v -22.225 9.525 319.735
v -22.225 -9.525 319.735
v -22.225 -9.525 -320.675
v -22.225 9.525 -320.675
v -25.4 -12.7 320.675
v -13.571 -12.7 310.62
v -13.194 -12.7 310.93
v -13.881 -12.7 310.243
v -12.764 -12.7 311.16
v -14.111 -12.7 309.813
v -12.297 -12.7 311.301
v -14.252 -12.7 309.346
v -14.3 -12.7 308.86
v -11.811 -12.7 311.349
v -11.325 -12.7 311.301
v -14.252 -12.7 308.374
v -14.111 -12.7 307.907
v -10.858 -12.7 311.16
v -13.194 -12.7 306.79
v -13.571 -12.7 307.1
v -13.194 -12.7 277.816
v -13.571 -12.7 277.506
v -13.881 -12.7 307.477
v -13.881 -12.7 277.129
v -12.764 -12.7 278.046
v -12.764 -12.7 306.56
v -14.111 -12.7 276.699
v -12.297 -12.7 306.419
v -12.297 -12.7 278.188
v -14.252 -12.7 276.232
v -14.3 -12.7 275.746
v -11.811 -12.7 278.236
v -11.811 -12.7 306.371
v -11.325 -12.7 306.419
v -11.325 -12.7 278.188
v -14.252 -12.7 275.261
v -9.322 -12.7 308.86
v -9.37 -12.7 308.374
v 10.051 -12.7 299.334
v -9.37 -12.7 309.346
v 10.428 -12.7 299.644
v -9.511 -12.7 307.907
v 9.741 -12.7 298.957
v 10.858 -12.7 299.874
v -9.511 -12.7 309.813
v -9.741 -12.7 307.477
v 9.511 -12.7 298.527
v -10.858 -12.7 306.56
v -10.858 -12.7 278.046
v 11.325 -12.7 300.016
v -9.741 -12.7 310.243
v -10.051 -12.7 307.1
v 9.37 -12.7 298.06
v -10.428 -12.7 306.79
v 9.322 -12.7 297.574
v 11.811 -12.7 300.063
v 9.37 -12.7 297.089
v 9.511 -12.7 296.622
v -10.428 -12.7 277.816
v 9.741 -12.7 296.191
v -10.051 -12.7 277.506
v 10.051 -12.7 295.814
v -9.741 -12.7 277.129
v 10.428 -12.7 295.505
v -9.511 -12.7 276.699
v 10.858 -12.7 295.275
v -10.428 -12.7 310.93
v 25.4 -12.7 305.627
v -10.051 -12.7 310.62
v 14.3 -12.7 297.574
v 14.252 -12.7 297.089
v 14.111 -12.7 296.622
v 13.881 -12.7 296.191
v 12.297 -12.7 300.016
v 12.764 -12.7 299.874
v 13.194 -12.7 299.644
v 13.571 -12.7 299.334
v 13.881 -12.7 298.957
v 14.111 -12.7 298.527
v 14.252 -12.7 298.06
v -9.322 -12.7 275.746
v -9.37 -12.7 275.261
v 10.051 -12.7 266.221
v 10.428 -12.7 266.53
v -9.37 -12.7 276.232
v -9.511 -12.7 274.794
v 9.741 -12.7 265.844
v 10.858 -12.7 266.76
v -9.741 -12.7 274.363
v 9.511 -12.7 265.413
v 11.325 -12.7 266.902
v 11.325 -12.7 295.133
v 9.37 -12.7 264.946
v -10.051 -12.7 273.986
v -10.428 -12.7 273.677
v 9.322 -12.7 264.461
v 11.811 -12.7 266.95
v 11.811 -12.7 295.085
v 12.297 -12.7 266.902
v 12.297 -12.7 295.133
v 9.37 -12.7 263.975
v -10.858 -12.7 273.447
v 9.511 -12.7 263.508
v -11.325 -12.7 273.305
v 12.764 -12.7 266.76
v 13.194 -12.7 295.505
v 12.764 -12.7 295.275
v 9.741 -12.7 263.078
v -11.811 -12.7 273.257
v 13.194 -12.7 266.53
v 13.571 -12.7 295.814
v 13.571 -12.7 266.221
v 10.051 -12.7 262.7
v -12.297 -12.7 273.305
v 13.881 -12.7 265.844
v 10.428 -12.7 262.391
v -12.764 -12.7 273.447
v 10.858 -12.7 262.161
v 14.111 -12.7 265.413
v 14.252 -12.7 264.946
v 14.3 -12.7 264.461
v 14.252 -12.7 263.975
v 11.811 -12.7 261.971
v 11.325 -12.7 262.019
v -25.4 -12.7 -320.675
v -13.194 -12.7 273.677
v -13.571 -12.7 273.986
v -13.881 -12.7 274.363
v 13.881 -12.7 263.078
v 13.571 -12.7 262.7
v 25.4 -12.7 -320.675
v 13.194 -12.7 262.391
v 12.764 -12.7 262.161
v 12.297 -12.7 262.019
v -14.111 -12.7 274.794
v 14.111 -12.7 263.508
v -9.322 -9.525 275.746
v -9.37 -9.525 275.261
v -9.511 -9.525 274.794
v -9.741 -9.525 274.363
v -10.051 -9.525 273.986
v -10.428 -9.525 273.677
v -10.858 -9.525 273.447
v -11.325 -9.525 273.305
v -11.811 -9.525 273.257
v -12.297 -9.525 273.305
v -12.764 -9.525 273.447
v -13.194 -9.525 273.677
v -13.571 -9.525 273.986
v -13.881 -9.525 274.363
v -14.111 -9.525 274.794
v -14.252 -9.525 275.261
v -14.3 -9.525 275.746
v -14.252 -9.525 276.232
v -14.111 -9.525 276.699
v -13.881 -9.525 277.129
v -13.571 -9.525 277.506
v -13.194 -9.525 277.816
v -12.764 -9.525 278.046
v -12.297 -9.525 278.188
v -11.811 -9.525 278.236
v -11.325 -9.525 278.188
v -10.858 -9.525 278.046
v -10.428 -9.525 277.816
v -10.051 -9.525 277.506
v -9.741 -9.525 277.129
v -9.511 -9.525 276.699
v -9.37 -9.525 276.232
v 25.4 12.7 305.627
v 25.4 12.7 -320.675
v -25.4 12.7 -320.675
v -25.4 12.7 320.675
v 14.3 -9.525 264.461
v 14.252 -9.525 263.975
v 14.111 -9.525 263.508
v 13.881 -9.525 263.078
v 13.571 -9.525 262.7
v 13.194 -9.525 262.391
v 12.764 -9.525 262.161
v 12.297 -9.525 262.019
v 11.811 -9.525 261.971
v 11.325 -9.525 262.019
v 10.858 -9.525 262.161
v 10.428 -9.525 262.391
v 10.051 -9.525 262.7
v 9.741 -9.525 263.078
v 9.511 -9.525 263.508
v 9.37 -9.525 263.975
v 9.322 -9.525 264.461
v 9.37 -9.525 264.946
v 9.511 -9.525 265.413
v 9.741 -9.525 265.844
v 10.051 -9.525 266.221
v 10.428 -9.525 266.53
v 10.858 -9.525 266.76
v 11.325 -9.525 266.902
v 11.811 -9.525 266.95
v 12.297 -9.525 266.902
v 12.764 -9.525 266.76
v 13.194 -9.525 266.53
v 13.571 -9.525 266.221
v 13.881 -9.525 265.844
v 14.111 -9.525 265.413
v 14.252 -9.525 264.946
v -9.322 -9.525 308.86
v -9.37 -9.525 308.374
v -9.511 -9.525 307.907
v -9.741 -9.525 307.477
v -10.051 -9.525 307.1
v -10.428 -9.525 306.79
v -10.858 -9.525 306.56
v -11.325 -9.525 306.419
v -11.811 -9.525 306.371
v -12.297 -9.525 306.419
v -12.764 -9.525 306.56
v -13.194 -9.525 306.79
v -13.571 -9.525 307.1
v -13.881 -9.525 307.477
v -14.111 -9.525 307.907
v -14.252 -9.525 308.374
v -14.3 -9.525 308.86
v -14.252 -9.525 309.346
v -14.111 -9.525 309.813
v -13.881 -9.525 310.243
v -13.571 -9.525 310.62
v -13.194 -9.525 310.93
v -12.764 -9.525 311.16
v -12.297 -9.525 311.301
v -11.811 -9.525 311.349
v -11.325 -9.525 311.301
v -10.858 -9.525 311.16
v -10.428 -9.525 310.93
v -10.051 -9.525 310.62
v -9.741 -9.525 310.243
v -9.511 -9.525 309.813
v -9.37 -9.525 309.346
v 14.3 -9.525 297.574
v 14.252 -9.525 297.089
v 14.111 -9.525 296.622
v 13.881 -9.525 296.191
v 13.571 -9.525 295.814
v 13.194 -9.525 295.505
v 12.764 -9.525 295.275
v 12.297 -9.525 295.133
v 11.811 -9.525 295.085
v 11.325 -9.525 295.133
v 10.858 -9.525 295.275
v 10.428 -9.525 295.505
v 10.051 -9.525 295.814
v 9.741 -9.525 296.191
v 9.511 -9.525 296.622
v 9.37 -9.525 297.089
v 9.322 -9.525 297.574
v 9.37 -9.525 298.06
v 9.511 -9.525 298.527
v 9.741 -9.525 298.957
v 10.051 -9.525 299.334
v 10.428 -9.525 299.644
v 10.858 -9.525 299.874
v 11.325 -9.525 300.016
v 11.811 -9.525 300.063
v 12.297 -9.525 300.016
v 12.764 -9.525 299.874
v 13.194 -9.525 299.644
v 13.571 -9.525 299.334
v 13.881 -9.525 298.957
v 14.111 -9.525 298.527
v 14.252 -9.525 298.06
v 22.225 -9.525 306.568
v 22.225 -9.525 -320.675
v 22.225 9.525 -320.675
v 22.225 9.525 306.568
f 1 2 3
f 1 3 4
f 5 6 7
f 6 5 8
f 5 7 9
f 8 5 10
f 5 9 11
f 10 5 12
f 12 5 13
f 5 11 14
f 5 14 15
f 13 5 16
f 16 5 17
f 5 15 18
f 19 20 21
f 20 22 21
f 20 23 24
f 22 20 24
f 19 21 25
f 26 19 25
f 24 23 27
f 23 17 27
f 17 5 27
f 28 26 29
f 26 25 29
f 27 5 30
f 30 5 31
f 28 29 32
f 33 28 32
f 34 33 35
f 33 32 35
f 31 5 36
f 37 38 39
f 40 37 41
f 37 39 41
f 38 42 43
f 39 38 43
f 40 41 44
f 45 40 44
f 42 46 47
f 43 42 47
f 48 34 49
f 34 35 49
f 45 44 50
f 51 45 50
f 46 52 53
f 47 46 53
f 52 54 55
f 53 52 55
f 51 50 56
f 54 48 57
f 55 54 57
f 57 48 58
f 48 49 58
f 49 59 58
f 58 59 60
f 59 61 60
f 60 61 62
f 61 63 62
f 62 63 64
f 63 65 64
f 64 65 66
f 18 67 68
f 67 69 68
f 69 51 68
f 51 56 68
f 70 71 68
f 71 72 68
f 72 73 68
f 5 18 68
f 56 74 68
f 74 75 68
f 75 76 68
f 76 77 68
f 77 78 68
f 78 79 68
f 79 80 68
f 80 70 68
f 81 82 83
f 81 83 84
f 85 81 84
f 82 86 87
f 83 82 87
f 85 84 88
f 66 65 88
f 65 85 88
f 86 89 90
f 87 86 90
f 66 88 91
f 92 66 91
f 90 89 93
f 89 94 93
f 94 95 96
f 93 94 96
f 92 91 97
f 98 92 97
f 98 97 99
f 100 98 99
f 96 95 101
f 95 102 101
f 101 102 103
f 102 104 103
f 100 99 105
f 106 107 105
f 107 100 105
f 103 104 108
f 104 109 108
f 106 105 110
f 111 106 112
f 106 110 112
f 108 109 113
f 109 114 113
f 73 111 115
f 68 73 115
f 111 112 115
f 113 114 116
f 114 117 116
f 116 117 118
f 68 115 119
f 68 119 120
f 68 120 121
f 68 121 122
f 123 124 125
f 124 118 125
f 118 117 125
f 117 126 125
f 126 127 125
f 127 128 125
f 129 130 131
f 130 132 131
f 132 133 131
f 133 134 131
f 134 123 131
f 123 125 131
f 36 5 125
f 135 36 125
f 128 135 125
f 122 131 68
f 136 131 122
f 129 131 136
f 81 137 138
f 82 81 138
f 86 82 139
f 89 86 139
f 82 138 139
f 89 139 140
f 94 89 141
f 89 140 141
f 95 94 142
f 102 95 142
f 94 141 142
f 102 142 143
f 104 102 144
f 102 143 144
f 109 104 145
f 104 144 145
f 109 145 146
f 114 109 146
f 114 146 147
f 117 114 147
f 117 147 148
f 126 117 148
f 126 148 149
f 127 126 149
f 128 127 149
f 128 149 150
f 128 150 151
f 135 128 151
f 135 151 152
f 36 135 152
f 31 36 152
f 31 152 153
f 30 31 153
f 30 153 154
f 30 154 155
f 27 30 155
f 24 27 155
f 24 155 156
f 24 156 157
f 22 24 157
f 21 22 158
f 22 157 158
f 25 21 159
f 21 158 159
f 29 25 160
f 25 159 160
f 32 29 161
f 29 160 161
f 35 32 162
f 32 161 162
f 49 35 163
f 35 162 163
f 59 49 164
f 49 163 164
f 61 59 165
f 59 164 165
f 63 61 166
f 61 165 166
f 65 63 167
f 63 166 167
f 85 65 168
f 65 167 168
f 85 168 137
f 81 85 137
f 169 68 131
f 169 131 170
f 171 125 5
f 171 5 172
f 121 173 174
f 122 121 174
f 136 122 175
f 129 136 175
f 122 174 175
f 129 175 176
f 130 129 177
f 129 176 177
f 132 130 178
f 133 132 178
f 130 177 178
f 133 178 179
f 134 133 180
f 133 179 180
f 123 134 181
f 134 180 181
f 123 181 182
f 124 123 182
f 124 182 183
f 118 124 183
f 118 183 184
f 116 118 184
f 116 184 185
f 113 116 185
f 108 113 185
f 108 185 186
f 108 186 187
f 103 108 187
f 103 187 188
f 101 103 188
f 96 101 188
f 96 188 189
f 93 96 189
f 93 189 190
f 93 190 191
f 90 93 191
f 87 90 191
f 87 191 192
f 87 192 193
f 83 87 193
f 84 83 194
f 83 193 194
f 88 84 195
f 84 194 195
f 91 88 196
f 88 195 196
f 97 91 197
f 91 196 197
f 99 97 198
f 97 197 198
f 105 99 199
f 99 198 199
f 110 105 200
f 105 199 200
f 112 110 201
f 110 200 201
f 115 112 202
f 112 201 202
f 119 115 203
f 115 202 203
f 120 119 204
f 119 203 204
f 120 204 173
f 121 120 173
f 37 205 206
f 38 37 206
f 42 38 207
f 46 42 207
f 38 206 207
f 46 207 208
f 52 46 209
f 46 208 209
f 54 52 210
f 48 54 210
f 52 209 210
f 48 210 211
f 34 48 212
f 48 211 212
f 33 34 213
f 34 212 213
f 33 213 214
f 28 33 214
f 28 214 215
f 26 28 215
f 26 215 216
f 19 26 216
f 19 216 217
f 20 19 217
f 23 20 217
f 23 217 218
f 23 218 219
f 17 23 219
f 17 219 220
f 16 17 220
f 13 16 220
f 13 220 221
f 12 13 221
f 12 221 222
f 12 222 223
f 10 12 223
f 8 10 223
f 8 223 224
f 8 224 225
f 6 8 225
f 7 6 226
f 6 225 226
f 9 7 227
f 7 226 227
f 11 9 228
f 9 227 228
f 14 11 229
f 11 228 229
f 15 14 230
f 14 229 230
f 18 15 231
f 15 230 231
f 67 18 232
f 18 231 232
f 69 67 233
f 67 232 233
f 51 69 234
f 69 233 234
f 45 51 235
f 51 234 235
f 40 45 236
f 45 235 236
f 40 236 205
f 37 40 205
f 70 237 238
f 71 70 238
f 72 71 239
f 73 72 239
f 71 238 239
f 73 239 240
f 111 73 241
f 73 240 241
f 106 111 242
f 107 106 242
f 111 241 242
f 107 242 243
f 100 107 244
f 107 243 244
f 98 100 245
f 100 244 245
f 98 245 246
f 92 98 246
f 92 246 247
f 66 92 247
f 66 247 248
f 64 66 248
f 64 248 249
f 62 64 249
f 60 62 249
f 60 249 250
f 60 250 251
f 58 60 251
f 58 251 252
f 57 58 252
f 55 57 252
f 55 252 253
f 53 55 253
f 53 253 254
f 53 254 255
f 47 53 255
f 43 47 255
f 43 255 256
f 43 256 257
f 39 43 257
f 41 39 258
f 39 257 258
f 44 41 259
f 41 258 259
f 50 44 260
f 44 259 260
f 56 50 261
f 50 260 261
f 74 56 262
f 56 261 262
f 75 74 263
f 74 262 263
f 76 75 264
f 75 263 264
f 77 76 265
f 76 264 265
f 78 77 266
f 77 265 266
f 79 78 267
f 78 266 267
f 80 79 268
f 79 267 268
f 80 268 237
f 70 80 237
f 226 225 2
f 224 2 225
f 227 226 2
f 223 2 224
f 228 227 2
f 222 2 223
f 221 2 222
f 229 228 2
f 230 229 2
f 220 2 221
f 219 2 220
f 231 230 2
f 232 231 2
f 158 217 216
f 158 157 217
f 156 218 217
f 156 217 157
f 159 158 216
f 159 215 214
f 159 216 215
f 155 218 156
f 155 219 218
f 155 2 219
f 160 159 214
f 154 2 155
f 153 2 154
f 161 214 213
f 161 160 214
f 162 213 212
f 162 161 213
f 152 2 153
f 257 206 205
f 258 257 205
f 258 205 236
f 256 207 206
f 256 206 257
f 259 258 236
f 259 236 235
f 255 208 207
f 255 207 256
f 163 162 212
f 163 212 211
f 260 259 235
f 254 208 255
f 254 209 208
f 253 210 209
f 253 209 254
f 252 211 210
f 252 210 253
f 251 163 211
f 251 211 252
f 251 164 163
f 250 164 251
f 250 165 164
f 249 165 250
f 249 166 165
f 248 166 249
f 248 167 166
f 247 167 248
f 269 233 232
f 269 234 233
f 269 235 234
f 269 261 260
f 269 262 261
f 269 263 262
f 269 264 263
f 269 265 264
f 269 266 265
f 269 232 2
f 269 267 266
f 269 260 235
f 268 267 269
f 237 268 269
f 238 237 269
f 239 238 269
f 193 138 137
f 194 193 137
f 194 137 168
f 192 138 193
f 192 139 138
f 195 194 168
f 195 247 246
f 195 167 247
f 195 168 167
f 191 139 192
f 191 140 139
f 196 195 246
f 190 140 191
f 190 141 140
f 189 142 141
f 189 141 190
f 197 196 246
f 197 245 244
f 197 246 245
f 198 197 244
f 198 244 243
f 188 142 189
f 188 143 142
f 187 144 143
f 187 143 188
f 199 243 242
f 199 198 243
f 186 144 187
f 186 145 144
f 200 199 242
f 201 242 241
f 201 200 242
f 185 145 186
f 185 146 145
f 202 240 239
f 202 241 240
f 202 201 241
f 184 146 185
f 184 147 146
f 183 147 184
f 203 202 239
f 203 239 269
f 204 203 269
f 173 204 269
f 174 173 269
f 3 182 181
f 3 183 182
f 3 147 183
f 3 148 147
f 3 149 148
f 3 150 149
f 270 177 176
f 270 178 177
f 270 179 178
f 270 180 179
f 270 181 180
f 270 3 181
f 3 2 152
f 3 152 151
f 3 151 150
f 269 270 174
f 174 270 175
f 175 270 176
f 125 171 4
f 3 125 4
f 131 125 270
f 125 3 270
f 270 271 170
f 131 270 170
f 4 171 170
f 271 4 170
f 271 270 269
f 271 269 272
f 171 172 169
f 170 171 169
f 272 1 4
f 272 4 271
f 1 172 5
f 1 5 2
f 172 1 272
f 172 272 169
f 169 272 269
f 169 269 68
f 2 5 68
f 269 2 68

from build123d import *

# Parameters (mm, degrees)
BOSS_EXTRUDE1_DEPTH        = 320.675
BOSS_EXTRUDE1_DEPTH_BACK   = 320.675
SKETCH3_W                  = 50.8
SKETCH3_H                  = 25.4
SKETCH3_W_2                = 44.45
SKETCH3_H_2                = 19.05
CUT_EXTRUDE1_DEPTH         = 323.680609311
CUT_EXTRUDE1_DEPTH_BACK    = 323.680609311
F_10_CLEARANCE_HOLE1_D     = 4.9784
F_10_CLEARANCE_HOLE1_DEPTH = 5.08
F_10_CLEARANCE_HOLE1_TIP   = 1.495662253


with BuildPart() as part:
    # Sketch3 → Boss-Extrude1 (new, two sides: drawn at the far end of the back side and taken through both)
    with BuildSketch(Plane.XY.offset(-BOSS_EXTRUDE1_DEPTH_BACK)):
        Rectangle(SKETCH3_W, SKETCH3_H)
        Rectangle(SKETCH3_W_2, SKETCH3_H_2, mode=Mode.SUBTRACT)
    extrude(amount=BOSS_EXTRUDE1_DEPTH + BOSS_EXTRUDE1_DEPTH_BACK)

    # Sketch4 → Cut-Extrude1 (cut, two sides: drawn at the far end of the back side and taken through both)
    with BuildSketch(Plane(origin=(0, 12.7, 0), x_dir=(1, 0, 0), z_dir=(0, 1, 0)).offset(-CUT_EXTRUDE1_DEPTH_BACK)):
        Polygon((1322.117470931, -320.675), (25.4, -320.675), (-25.4, -320.675), (25.4, -305.627354456), (1268.718301677, 62.660305034), (3837.350959621, 420.474595165), (3890.750128875, 37.139290131), align=None)
    extrude(amount=CUT_EXTRUDE1_DEPTH + CUT_EXTRUDE1_DEPTH_BACK, mode=Mode.SUBTRACT)

    # #10 Clearance Hole1
    with Locations(Plane(origin=(0, -12.7, 0), x_dir=(-1, 0, 0), z_dir=(0, -1, 0))):
        with Locations((-11.811, -264.460593775), (11.811, -275.746327933), (-11.811, -297.574221755), (11.811, -308.859955913)):
            Hole(F_10_CLEARANCE_HOLE1_D / 2, depth=F_10_CLEARANCE_HOLE1_DEPTH)
            with Locations((0, 0, -(F_10_CLEARANCE_HOLE1_DEPTH + F_10_CLEARANCE_HOLE1_TIP / 2))):  # 118° drill point
                Cone(0, F_10_CLEARANCE_HOLE1_D / 2, F_10_CLEARANCE_HOLE1_TIP, mode=Mode.SUBTRACT)


solid = part.part
